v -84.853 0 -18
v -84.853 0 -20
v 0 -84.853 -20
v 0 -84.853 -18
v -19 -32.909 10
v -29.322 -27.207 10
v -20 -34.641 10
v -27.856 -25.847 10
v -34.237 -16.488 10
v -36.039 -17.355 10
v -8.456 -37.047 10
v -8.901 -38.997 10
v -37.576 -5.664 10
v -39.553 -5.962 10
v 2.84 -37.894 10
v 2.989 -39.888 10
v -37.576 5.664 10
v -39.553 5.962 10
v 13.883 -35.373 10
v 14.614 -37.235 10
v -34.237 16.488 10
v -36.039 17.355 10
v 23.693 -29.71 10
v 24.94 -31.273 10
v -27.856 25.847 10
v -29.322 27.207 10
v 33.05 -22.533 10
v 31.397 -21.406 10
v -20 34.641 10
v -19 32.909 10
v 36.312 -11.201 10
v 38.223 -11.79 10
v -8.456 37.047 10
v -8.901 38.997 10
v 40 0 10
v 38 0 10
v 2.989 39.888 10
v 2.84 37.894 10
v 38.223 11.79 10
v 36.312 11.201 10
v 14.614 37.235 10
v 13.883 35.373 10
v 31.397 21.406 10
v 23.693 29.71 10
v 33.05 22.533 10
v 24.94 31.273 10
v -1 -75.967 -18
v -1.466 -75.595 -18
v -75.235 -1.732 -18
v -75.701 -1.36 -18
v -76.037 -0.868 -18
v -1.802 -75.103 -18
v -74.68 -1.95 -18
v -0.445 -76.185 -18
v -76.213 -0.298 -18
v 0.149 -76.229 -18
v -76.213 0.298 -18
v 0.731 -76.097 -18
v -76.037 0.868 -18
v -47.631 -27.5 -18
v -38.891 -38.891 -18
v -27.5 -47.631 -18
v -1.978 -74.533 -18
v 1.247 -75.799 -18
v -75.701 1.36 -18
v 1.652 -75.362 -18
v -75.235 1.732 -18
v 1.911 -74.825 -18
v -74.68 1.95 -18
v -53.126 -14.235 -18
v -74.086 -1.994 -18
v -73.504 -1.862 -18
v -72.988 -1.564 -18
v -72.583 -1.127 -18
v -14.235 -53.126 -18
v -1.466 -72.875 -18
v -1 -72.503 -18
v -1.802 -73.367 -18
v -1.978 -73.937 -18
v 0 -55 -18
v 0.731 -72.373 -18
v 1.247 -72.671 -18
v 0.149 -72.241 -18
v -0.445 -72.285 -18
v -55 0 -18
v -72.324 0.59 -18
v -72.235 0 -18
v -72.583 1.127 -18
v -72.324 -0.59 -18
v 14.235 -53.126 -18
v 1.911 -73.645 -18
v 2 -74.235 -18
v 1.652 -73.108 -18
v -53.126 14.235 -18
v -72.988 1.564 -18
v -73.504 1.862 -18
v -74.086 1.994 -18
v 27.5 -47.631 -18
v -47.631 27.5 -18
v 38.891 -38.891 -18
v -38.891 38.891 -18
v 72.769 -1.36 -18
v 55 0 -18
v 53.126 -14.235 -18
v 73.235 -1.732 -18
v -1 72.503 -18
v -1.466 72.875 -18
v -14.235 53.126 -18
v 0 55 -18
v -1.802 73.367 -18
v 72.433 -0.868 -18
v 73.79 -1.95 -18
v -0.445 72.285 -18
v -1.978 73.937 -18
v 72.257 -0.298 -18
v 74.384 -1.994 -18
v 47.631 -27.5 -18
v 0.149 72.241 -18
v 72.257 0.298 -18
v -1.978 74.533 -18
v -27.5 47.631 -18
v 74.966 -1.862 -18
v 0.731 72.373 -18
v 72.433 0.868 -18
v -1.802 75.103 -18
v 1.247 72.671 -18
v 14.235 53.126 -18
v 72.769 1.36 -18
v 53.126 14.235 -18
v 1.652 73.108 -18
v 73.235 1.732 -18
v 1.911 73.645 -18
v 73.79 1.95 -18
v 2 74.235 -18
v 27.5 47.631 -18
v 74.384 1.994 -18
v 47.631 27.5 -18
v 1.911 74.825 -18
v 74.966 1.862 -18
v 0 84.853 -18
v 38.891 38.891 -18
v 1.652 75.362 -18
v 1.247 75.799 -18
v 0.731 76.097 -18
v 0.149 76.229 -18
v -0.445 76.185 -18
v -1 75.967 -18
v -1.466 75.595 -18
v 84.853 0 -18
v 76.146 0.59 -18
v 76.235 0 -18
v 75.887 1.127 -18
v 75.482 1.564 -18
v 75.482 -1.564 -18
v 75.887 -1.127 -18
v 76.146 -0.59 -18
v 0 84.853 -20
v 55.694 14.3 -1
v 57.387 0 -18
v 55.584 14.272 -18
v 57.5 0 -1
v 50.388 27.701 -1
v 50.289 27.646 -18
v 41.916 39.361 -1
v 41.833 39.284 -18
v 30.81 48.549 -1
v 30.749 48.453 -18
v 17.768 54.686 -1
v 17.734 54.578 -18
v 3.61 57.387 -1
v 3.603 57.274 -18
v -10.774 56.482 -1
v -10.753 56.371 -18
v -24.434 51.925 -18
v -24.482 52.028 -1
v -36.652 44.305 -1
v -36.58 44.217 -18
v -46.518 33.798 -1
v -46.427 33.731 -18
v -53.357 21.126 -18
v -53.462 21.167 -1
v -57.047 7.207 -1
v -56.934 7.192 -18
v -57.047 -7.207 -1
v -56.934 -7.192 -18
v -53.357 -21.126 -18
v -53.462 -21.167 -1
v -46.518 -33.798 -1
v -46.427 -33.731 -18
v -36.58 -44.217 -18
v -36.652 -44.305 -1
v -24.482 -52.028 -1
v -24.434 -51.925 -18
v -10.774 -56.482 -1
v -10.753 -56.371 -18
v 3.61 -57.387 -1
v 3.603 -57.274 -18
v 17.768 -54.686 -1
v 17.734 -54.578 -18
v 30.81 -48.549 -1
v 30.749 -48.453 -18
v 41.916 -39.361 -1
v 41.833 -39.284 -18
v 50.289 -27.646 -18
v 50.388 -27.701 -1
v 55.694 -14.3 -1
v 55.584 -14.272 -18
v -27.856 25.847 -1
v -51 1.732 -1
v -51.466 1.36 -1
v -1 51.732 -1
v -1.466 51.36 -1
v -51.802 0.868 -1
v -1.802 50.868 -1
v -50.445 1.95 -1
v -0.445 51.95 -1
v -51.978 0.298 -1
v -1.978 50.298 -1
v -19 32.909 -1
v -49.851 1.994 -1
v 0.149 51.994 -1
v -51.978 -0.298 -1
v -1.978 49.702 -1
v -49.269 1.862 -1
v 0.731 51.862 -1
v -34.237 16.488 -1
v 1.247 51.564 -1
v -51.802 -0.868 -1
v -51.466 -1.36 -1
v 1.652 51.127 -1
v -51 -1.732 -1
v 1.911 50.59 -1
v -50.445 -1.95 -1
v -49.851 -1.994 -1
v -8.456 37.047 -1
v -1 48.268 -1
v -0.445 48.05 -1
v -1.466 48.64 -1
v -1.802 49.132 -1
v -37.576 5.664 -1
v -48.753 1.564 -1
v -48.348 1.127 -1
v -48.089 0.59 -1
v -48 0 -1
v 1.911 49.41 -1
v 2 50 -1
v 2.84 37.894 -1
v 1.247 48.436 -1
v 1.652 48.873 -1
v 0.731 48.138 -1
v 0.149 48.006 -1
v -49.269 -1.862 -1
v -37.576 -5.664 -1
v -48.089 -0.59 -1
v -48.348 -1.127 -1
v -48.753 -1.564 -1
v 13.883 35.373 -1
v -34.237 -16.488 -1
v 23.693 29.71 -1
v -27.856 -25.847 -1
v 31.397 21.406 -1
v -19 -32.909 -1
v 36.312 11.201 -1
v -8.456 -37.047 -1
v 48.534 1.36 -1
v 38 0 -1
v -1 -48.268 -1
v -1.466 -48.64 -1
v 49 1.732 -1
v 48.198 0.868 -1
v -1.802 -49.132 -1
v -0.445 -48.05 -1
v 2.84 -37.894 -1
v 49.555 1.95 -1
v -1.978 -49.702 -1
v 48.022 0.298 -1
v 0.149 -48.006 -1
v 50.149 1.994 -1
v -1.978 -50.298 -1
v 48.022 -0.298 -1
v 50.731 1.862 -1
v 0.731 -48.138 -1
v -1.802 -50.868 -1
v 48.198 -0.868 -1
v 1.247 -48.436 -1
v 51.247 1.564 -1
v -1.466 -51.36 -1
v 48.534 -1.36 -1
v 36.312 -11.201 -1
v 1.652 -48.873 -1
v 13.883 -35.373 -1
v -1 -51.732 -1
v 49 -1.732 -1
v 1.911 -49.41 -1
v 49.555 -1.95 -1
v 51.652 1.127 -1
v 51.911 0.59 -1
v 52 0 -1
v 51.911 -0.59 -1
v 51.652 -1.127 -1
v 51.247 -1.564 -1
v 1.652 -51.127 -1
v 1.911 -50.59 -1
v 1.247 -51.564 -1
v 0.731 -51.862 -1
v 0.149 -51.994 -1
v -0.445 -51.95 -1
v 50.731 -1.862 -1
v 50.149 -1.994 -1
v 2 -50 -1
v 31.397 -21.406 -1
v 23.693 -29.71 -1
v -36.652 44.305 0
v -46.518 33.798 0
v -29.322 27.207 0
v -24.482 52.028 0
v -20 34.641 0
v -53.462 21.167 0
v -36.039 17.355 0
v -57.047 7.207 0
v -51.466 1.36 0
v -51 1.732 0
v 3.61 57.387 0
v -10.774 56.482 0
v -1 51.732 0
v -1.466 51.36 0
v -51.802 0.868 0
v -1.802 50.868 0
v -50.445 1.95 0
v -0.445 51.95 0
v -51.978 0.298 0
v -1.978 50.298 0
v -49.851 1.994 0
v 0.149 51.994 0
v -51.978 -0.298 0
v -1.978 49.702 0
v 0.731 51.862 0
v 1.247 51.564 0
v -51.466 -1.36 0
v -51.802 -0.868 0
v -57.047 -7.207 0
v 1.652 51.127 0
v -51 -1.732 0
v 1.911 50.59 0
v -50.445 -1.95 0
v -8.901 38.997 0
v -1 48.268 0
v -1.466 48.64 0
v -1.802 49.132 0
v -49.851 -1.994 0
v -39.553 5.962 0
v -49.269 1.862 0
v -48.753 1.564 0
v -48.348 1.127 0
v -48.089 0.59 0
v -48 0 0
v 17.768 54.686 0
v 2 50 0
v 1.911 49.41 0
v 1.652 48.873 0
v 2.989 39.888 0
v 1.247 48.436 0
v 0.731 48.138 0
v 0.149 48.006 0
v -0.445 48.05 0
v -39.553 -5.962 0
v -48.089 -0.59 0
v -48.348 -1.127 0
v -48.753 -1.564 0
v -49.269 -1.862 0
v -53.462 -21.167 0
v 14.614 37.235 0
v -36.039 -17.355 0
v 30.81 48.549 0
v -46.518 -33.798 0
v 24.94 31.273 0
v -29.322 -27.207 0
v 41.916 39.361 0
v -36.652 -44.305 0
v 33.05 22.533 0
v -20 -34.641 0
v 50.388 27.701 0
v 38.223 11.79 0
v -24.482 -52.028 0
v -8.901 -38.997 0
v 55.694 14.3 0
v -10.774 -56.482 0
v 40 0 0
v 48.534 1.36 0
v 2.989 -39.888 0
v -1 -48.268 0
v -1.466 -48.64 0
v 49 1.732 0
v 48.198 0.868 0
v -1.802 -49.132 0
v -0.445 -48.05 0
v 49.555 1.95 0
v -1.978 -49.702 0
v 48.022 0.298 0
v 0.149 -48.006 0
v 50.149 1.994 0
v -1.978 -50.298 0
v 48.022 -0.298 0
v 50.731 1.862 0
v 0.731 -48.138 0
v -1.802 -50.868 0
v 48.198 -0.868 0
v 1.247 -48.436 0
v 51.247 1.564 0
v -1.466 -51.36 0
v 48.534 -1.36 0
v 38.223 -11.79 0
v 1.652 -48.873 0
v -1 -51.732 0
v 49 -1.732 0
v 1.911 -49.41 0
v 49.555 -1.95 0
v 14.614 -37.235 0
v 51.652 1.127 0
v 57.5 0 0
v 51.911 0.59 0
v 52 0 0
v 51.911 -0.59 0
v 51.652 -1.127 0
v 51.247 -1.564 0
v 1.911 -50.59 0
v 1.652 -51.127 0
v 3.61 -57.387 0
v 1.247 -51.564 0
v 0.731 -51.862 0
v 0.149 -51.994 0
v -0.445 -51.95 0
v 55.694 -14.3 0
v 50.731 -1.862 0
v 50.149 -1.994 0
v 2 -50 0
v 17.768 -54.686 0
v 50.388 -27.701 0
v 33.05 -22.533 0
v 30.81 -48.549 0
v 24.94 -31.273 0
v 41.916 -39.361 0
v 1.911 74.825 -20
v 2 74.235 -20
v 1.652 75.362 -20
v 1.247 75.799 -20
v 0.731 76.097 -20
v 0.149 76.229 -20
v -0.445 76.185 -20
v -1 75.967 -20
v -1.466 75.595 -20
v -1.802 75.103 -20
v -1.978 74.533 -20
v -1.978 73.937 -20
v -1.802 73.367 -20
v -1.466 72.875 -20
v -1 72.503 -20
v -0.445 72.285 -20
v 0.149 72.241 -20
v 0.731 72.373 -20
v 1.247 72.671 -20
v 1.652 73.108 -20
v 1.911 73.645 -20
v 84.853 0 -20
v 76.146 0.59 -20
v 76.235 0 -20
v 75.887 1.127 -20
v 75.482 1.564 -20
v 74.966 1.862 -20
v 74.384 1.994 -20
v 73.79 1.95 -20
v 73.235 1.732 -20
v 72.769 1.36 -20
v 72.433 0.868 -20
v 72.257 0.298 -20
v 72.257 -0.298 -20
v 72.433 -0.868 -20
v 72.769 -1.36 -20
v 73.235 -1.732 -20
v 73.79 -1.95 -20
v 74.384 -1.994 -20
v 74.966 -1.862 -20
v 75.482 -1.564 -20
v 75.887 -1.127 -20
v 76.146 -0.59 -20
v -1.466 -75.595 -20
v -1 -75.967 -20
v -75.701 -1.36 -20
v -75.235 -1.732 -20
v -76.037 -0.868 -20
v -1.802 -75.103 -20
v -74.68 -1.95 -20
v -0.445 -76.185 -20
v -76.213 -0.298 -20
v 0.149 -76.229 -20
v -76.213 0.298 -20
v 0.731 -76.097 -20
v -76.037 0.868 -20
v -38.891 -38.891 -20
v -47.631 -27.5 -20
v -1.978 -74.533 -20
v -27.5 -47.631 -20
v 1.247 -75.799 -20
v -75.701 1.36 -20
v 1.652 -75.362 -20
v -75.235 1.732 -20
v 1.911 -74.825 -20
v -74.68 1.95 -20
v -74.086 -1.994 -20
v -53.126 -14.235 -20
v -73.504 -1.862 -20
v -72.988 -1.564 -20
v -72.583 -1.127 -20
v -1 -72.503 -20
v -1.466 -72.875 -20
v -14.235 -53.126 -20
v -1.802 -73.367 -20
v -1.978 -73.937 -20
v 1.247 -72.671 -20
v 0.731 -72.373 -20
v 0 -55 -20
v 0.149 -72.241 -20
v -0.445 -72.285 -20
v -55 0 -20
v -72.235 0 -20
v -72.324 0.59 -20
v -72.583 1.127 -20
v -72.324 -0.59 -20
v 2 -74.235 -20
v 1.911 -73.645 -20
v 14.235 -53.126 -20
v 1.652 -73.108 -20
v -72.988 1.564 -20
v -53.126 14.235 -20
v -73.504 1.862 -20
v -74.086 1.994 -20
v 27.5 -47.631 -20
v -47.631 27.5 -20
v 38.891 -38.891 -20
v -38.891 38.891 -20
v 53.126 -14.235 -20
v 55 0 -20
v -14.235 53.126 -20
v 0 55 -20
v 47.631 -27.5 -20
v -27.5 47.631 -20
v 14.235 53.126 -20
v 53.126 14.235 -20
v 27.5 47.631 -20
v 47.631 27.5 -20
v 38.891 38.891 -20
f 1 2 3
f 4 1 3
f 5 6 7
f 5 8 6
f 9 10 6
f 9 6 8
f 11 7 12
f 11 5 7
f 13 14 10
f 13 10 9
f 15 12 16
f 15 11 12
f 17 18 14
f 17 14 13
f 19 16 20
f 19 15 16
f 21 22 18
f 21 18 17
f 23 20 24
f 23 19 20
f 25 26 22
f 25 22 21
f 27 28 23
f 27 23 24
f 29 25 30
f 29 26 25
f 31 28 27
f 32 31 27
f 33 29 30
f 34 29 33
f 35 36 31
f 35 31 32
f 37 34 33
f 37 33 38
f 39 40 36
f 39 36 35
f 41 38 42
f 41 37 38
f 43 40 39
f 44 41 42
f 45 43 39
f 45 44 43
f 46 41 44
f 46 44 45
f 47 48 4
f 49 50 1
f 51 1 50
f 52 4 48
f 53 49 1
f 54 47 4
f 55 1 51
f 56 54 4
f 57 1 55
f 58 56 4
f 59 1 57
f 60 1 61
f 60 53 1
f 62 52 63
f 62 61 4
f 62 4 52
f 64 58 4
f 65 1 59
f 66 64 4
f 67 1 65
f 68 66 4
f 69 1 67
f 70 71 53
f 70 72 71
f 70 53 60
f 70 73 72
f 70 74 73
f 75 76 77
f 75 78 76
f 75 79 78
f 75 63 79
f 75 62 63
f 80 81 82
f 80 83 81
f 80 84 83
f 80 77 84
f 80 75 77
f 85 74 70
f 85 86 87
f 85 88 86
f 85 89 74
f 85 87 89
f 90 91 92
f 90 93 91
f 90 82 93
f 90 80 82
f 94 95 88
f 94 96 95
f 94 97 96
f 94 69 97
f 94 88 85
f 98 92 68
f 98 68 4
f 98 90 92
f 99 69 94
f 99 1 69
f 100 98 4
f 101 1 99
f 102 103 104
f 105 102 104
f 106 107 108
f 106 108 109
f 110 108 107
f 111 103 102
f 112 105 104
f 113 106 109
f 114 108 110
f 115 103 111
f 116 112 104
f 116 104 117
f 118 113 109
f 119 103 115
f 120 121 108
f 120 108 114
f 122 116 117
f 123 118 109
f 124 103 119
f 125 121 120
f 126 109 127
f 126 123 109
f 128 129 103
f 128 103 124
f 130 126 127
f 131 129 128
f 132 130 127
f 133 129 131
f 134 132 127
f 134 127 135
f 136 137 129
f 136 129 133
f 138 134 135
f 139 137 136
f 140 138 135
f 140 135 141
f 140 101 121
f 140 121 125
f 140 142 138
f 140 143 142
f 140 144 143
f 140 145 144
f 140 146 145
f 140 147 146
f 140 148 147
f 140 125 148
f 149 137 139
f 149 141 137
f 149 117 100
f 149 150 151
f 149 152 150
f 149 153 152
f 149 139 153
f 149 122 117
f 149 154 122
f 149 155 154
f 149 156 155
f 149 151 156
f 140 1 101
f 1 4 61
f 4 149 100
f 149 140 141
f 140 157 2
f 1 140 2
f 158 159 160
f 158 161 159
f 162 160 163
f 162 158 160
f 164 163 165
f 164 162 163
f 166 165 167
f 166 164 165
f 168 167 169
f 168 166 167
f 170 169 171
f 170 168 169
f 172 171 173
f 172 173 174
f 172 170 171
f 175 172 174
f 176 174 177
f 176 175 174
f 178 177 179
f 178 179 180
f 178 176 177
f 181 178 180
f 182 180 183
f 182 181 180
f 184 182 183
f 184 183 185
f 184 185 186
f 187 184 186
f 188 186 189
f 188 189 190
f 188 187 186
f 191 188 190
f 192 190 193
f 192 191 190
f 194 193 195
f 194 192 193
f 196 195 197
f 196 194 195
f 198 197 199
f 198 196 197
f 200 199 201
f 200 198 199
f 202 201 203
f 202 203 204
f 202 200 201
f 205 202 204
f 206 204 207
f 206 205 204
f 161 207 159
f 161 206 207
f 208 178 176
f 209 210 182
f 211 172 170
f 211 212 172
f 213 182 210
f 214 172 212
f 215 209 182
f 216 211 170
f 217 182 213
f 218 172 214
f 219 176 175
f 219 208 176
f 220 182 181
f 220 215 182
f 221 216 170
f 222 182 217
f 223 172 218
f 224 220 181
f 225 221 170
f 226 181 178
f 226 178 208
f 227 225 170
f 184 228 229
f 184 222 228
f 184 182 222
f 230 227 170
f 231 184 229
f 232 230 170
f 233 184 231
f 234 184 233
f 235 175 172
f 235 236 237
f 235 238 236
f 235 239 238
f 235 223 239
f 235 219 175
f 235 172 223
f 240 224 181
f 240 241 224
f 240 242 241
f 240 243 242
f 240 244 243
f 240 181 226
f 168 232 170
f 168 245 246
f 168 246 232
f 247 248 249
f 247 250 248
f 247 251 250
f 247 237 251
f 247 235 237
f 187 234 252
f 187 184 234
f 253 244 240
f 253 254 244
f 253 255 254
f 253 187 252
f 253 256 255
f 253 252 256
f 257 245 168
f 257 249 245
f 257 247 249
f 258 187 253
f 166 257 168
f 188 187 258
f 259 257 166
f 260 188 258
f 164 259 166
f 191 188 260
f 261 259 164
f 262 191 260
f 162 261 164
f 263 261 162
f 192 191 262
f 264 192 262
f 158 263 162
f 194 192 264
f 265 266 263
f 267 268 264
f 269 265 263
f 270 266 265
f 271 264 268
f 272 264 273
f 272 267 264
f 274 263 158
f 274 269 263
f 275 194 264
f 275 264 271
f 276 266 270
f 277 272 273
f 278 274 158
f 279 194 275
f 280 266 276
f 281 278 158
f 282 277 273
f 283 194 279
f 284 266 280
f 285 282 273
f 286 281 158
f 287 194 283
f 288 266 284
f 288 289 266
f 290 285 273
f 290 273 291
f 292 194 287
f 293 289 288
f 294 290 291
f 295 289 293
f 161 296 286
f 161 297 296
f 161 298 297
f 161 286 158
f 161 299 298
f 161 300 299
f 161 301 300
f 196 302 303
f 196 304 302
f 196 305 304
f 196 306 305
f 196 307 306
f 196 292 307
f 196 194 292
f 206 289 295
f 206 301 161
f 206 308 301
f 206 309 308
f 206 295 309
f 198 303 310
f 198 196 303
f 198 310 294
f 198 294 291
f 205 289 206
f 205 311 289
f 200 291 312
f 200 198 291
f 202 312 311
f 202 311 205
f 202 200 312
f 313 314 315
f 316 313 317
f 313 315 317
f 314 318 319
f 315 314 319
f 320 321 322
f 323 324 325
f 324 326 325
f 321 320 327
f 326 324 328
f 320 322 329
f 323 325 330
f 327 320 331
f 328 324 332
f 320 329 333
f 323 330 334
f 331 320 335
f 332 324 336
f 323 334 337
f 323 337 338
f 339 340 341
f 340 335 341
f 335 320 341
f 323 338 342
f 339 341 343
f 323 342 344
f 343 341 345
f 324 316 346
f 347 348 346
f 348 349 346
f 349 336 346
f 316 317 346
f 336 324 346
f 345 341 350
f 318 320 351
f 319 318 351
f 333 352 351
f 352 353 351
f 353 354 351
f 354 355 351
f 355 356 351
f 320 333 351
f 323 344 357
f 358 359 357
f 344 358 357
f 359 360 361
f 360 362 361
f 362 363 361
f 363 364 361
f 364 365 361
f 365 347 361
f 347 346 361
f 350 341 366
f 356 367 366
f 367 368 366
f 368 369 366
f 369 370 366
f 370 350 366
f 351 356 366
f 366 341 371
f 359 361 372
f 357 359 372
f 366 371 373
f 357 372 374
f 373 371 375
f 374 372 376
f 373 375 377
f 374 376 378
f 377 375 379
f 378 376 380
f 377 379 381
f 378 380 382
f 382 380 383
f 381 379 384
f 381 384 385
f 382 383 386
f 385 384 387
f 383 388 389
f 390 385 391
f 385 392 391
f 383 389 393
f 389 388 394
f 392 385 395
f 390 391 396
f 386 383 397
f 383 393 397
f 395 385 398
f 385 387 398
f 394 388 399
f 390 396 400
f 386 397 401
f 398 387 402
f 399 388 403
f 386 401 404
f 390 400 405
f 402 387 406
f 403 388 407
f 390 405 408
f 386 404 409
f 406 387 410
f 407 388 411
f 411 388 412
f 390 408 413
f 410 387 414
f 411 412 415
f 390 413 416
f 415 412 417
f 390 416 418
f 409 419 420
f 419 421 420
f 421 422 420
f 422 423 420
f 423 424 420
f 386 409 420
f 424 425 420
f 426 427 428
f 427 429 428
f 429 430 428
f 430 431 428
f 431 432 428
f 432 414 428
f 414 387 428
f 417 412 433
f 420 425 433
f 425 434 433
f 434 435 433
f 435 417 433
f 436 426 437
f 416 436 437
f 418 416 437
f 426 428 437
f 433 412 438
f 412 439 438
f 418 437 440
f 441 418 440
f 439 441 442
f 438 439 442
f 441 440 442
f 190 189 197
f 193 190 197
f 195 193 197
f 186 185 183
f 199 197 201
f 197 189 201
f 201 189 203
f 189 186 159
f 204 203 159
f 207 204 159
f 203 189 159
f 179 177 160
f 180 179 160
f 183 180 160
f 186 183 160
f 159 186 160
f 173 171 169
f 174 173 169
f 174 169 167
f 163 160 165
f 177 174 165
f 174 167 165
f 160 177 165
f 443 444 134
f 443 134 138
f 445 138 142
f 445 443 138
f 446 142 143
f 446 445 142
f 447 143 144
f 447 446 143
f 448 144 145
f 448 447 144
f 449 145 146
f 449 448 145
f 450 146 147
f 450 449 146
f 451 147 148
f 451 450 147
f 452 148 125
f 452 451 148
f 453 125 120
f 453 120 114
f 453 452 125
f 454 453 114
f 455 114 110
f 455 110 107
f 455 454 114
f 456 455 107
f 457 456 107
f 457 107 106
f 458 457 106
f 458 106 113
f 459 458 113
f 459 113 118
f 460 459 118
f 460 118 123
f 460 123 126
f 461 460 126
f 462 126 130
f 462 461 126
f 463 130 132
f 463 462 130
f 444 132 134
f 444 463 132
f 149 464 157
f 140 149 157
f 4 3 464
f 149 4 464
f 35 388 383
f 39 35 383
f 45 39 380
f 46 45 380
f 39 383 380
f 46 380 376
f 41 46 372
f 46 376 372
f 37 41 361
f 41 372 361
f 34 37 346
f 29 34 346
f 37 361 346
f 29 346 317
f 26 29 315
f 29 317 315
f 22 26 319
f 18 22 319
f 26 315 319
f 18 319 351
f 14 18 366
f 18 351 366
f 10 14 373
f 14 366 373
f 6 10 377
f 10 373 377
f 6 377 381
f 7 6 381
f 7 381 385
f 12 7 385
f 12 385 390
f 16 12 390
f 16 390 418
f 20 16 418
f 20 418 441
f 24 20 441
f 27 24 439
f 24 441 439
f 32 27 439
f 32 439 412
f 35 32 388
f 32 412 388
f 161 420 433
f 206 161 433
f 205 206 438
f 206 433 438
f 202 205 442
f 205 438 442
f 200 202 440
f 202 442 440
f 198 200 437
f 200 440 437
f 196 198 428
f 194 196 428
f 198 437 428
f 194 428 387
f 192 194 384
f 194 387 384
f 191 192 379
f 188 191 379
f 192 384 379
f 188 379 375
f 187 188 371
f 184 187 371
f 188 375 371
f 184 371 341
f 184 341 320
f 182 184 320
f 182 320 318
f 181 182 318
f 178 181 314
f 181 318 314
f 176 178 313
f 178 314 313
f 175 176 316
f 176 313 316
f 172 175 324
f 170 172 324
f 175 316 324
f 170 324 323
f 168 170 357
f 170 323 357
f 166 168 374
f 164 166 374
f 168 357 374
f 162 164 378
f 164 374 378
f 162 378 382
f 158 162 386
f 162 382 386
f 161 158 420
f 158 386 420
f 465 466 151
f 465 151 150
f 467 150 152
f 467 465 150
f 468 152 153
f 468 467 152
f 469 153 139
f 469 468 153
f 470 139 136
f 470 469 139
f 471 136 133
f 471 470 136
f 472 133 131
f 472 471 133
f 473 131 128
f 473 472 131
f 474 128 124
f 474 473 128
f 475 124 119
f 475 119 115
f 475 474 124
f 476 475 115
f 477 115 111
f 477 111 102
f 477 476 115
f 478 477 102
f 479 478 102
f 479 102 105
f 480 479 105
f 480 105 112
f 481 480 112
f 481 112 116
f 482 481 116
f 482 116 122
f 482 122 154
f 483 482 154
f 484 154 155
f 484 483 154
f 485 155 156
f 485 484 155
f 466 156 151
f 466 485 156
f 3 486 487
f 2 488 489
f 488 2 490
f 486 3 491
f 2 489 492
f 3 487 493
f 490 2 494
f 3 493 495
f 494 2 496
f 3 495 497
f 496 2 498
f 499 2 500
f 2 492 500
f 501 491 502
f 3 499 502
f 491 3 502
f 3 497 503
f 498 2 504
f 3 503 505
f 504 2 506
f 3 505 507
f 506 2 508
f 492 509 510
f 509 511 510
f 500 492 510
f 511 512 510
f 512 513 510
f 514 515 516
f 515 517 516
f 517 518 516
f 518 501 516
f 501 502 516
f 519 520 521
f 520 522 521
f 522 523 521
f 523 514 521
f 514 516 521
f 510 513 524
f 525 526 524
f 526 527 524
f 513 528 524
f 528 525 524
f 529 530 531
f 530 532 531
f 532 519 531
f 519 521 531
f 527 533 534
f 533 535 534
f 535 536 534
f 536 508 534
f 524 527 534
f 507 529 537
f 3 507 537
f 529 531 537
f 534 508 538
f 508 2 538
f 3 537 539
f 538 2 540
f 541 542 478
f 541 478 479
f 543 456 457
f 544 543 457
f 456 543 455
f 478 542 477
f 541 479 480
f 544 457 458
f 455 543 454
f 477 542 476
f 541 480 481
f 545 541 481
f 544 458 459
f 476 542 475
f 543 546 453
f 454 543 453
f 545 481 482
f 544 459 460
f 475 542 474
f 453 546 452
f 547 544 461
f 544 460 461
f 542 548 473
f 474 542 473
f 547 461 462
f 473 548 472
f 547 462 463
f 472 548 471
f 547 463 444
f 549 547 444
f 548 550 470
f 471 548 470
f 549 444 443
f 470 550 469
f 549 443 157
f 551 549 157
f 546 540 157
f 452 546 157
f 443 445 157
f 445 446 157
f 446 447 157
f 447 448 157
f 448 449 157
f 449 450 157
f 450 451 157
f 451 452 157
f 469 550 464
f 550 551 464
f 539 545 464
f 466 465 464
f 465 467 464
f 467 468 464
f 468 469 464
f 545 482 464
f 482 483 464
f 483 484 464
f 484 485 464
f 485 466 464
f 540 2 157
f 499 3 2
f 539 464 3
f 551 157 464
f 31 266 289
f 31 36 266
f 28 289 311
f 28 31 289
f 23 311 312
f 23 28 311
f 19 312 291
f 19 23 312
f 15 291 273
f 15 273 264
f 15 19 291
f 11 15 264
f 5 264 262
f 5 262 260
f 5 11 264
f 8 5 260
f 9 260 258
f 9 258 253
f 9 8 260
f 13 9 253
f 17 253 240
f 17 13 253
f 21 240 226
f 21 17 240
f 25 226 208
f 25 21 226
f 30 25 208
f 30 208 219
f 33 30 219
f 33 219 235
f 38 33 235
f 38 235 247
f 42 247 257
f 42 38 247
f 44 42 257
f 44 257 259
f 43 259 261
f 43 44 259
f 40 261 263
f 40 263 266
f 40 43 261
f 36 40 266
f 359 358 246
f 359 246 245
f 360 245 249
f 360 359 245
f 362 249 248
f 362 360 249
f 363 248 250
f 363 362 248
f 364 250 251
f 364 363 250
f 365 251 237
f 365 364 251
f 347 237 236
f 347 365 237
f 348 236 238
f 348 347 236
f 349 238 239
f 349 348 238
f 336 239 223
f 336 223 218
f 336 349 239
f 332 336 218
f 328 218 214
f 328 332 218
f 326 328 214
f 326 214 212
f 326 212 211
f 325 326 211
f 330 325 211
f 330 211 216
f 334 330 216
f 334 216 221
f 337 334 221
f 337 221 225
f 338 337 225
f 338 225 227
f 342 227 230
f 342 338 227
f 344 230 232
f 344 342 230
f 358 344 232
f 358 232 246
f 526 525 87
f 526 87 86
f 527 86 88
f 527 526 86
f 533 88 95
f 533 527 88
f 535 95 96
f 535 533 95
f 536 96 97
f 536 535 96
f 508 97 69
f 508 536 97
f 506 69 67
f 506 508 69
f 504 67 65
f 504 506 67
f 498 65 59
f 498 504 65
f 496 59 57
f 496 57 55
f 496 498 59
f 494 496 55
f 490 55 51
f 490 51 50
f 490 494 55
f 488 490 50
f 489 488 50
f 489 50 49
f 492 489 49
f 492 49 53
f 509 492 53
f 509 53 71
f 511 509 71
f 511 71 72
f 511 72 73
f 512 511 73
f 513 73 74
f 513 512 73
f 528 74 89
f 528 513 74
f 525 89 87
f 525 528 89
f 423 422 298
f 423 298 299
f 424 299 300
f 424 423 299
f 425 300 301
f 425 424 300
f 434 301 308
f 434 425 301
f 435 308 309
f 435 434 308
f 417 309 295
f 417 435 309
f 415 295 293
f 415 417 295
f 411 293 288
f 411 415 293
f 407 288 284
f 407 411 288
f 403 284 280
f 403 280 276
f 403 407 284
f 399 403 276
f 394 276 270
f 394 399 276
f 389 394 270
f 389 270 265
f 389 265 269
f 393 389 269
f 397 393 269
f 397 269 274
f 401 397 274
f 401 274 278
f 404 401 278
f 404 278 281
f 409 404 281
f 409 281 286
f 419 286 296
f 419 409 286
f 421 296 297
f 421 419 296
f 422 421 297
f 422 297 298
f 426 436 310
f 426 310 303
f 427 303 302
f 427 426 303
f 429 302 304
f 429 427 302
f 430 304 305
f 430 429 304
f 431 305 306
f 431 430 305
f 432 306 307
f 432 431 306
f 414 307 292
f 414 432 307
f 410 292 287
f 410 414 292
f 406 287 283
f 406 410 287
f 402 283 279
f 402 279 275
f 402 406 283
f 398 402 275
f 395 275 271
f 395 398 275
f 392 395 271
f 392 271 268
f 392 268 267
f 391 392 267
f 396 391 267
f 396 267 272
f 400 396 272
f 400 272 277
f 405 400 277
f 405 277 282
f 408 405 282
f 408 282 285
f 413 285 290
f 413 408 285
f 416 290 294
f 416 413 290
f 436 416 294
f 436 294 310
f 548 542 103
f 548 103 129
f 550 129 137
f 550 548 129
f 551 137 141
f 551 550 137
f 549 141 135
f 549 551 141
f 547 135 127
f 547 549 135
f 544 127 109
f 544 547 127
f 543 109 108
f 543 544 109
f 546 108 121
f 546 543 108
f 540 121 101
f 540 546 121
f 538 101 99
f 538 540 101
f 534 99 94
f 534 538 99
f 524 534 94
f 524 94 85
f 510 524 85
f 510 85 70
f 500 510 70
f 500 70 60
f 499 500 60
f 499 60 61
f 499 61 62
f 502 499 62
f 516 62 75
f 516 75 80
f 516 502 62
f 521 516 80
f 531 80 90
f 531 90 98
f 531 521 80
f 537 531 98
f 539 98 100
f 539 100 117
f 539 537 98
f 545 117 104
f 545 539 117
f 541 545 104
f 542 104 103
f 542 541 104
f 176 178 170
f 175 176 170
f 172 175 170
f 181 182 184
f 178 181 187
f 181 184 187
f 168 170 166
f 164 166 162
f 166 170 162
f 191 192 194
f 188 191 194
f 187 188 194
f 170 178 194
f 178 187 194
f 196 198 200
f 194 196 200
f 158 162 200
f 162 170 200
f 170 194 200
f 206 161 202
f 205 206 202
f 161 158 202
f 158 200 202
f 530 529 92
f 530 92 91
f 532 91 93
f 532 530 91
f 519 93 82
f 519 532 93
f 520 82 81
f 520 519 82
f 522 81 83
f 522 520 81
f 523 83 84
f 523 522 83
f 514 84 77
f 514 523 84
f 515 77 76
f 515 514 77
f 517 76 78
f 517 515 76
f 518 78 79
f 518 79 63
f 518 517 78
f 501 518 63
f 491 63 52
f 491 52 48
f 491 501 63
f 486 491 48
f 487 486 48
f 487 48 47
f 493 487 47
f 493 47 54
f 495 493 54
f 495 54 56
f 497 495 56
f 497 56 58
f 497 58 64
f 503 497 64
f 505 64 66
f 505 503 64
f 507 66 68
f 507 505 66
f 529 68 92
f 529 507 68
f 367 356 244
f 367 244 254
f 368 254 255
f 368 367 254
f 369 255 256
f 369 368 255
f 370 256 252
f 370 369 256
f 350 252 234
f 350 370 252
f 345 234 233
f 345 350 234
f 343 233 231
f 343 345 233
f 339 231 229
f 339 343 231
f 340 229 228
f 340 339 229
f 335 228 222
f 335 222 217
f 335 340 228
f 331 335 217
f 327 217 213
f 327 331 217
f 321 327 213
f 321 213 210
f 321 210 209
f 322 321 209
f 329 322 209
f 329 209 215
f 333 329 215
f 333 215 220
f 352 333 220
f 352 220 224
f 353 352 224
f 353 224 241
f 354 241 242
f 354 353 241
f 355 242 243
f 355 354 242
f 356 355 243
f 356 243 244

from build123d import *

# Parameters (mm, degrees)
F0_R     = 40
F0_R_2   = 38
F1_DEPTH = 10
F2_R     = 57.5
F2_R_2   = 2
F2_R_3   = 38
F3_DEPTH = 1
F5_R     = 2
F5_R_2   = 55
F6_DEPTH = 2
F7_R     = 57.386985
F8_R     = 57.5


with BuildPart() as f1:
    # F0 (on Top) → F1 (new body)
    with BuildSketch(Plane.XY):
        Circle(F0_R)
        Circle(F0_R_2, mode=Mode.SUBTRACT)
    extrude(amount=F1_DEPTH)

    # F2 (on face) → F3 (join)
    with BuildSketch(Plane(origin=(0, 0, 0), x_dir=(1, 0, 0), z_dir=(0, 0, -1))):
        Circle(F2_R)
        with Locations((0, -50)):
            Circle(F2_R_2, mode=Mode.SUBTRACT)
        with Locations((-50, 0)):
            Circle(F2_R_2, mode=Mode.SUBTRACT)
        Circle(F2_R_3, mode=Mode.SUBTRACT)
        with Locations((50, 0)):
            Circle(F2_R_2, mode=Mode.SUBTRACT)
        with Locations((0, 50)):
            Circle(F2_R_2, mode=Mode.SUBTRACT)
    extrude(amount=F3_DEPTH)


with BuildPart() as f6:
    # F5 (on offset) → F6 (new body)
    with BuildSketch(Plane.XY.offset(-20)):
        Polygon((0, 84.852814), (-84.852814, 0), (0, -84.852814), (84.852814, 0), align=None)
        with Locations((-74.235, 0)):
            Circle(F5_R, mode=Mode.SUBTRACT)
        with Locations((0, -74.235)):
            Circle(F5_R, mode=Mode.SUBTRACT)
        Circle(F5_R_2, mode=Mode.SUBTRACT)
        with Locations((74.235, 0)):
            Circle(F5_R, mode=Mode.SUBTRACT)
        with Locations((0, 74.235)):
            Circle(F5_R, mode=Mode.SUBTRACT)
    extrude(amount=F6_DEPTH)


with BuildPart() as f9:
    # F7 (on face) → F9 section 0
    with BuildSketch(Plane.XY.offset(-18)):
        Circle(F7_R)
    # F8 (on face) → F9 section 1
    with BuildSketch(Plane(origin=(0, 0, -1), x_dir=(1, 0, 0), z_dir=(0, 0, -1))):
        Circle(F8_R)
    loft()


solid = Compound([f1.part, f6.part, f9.part])
